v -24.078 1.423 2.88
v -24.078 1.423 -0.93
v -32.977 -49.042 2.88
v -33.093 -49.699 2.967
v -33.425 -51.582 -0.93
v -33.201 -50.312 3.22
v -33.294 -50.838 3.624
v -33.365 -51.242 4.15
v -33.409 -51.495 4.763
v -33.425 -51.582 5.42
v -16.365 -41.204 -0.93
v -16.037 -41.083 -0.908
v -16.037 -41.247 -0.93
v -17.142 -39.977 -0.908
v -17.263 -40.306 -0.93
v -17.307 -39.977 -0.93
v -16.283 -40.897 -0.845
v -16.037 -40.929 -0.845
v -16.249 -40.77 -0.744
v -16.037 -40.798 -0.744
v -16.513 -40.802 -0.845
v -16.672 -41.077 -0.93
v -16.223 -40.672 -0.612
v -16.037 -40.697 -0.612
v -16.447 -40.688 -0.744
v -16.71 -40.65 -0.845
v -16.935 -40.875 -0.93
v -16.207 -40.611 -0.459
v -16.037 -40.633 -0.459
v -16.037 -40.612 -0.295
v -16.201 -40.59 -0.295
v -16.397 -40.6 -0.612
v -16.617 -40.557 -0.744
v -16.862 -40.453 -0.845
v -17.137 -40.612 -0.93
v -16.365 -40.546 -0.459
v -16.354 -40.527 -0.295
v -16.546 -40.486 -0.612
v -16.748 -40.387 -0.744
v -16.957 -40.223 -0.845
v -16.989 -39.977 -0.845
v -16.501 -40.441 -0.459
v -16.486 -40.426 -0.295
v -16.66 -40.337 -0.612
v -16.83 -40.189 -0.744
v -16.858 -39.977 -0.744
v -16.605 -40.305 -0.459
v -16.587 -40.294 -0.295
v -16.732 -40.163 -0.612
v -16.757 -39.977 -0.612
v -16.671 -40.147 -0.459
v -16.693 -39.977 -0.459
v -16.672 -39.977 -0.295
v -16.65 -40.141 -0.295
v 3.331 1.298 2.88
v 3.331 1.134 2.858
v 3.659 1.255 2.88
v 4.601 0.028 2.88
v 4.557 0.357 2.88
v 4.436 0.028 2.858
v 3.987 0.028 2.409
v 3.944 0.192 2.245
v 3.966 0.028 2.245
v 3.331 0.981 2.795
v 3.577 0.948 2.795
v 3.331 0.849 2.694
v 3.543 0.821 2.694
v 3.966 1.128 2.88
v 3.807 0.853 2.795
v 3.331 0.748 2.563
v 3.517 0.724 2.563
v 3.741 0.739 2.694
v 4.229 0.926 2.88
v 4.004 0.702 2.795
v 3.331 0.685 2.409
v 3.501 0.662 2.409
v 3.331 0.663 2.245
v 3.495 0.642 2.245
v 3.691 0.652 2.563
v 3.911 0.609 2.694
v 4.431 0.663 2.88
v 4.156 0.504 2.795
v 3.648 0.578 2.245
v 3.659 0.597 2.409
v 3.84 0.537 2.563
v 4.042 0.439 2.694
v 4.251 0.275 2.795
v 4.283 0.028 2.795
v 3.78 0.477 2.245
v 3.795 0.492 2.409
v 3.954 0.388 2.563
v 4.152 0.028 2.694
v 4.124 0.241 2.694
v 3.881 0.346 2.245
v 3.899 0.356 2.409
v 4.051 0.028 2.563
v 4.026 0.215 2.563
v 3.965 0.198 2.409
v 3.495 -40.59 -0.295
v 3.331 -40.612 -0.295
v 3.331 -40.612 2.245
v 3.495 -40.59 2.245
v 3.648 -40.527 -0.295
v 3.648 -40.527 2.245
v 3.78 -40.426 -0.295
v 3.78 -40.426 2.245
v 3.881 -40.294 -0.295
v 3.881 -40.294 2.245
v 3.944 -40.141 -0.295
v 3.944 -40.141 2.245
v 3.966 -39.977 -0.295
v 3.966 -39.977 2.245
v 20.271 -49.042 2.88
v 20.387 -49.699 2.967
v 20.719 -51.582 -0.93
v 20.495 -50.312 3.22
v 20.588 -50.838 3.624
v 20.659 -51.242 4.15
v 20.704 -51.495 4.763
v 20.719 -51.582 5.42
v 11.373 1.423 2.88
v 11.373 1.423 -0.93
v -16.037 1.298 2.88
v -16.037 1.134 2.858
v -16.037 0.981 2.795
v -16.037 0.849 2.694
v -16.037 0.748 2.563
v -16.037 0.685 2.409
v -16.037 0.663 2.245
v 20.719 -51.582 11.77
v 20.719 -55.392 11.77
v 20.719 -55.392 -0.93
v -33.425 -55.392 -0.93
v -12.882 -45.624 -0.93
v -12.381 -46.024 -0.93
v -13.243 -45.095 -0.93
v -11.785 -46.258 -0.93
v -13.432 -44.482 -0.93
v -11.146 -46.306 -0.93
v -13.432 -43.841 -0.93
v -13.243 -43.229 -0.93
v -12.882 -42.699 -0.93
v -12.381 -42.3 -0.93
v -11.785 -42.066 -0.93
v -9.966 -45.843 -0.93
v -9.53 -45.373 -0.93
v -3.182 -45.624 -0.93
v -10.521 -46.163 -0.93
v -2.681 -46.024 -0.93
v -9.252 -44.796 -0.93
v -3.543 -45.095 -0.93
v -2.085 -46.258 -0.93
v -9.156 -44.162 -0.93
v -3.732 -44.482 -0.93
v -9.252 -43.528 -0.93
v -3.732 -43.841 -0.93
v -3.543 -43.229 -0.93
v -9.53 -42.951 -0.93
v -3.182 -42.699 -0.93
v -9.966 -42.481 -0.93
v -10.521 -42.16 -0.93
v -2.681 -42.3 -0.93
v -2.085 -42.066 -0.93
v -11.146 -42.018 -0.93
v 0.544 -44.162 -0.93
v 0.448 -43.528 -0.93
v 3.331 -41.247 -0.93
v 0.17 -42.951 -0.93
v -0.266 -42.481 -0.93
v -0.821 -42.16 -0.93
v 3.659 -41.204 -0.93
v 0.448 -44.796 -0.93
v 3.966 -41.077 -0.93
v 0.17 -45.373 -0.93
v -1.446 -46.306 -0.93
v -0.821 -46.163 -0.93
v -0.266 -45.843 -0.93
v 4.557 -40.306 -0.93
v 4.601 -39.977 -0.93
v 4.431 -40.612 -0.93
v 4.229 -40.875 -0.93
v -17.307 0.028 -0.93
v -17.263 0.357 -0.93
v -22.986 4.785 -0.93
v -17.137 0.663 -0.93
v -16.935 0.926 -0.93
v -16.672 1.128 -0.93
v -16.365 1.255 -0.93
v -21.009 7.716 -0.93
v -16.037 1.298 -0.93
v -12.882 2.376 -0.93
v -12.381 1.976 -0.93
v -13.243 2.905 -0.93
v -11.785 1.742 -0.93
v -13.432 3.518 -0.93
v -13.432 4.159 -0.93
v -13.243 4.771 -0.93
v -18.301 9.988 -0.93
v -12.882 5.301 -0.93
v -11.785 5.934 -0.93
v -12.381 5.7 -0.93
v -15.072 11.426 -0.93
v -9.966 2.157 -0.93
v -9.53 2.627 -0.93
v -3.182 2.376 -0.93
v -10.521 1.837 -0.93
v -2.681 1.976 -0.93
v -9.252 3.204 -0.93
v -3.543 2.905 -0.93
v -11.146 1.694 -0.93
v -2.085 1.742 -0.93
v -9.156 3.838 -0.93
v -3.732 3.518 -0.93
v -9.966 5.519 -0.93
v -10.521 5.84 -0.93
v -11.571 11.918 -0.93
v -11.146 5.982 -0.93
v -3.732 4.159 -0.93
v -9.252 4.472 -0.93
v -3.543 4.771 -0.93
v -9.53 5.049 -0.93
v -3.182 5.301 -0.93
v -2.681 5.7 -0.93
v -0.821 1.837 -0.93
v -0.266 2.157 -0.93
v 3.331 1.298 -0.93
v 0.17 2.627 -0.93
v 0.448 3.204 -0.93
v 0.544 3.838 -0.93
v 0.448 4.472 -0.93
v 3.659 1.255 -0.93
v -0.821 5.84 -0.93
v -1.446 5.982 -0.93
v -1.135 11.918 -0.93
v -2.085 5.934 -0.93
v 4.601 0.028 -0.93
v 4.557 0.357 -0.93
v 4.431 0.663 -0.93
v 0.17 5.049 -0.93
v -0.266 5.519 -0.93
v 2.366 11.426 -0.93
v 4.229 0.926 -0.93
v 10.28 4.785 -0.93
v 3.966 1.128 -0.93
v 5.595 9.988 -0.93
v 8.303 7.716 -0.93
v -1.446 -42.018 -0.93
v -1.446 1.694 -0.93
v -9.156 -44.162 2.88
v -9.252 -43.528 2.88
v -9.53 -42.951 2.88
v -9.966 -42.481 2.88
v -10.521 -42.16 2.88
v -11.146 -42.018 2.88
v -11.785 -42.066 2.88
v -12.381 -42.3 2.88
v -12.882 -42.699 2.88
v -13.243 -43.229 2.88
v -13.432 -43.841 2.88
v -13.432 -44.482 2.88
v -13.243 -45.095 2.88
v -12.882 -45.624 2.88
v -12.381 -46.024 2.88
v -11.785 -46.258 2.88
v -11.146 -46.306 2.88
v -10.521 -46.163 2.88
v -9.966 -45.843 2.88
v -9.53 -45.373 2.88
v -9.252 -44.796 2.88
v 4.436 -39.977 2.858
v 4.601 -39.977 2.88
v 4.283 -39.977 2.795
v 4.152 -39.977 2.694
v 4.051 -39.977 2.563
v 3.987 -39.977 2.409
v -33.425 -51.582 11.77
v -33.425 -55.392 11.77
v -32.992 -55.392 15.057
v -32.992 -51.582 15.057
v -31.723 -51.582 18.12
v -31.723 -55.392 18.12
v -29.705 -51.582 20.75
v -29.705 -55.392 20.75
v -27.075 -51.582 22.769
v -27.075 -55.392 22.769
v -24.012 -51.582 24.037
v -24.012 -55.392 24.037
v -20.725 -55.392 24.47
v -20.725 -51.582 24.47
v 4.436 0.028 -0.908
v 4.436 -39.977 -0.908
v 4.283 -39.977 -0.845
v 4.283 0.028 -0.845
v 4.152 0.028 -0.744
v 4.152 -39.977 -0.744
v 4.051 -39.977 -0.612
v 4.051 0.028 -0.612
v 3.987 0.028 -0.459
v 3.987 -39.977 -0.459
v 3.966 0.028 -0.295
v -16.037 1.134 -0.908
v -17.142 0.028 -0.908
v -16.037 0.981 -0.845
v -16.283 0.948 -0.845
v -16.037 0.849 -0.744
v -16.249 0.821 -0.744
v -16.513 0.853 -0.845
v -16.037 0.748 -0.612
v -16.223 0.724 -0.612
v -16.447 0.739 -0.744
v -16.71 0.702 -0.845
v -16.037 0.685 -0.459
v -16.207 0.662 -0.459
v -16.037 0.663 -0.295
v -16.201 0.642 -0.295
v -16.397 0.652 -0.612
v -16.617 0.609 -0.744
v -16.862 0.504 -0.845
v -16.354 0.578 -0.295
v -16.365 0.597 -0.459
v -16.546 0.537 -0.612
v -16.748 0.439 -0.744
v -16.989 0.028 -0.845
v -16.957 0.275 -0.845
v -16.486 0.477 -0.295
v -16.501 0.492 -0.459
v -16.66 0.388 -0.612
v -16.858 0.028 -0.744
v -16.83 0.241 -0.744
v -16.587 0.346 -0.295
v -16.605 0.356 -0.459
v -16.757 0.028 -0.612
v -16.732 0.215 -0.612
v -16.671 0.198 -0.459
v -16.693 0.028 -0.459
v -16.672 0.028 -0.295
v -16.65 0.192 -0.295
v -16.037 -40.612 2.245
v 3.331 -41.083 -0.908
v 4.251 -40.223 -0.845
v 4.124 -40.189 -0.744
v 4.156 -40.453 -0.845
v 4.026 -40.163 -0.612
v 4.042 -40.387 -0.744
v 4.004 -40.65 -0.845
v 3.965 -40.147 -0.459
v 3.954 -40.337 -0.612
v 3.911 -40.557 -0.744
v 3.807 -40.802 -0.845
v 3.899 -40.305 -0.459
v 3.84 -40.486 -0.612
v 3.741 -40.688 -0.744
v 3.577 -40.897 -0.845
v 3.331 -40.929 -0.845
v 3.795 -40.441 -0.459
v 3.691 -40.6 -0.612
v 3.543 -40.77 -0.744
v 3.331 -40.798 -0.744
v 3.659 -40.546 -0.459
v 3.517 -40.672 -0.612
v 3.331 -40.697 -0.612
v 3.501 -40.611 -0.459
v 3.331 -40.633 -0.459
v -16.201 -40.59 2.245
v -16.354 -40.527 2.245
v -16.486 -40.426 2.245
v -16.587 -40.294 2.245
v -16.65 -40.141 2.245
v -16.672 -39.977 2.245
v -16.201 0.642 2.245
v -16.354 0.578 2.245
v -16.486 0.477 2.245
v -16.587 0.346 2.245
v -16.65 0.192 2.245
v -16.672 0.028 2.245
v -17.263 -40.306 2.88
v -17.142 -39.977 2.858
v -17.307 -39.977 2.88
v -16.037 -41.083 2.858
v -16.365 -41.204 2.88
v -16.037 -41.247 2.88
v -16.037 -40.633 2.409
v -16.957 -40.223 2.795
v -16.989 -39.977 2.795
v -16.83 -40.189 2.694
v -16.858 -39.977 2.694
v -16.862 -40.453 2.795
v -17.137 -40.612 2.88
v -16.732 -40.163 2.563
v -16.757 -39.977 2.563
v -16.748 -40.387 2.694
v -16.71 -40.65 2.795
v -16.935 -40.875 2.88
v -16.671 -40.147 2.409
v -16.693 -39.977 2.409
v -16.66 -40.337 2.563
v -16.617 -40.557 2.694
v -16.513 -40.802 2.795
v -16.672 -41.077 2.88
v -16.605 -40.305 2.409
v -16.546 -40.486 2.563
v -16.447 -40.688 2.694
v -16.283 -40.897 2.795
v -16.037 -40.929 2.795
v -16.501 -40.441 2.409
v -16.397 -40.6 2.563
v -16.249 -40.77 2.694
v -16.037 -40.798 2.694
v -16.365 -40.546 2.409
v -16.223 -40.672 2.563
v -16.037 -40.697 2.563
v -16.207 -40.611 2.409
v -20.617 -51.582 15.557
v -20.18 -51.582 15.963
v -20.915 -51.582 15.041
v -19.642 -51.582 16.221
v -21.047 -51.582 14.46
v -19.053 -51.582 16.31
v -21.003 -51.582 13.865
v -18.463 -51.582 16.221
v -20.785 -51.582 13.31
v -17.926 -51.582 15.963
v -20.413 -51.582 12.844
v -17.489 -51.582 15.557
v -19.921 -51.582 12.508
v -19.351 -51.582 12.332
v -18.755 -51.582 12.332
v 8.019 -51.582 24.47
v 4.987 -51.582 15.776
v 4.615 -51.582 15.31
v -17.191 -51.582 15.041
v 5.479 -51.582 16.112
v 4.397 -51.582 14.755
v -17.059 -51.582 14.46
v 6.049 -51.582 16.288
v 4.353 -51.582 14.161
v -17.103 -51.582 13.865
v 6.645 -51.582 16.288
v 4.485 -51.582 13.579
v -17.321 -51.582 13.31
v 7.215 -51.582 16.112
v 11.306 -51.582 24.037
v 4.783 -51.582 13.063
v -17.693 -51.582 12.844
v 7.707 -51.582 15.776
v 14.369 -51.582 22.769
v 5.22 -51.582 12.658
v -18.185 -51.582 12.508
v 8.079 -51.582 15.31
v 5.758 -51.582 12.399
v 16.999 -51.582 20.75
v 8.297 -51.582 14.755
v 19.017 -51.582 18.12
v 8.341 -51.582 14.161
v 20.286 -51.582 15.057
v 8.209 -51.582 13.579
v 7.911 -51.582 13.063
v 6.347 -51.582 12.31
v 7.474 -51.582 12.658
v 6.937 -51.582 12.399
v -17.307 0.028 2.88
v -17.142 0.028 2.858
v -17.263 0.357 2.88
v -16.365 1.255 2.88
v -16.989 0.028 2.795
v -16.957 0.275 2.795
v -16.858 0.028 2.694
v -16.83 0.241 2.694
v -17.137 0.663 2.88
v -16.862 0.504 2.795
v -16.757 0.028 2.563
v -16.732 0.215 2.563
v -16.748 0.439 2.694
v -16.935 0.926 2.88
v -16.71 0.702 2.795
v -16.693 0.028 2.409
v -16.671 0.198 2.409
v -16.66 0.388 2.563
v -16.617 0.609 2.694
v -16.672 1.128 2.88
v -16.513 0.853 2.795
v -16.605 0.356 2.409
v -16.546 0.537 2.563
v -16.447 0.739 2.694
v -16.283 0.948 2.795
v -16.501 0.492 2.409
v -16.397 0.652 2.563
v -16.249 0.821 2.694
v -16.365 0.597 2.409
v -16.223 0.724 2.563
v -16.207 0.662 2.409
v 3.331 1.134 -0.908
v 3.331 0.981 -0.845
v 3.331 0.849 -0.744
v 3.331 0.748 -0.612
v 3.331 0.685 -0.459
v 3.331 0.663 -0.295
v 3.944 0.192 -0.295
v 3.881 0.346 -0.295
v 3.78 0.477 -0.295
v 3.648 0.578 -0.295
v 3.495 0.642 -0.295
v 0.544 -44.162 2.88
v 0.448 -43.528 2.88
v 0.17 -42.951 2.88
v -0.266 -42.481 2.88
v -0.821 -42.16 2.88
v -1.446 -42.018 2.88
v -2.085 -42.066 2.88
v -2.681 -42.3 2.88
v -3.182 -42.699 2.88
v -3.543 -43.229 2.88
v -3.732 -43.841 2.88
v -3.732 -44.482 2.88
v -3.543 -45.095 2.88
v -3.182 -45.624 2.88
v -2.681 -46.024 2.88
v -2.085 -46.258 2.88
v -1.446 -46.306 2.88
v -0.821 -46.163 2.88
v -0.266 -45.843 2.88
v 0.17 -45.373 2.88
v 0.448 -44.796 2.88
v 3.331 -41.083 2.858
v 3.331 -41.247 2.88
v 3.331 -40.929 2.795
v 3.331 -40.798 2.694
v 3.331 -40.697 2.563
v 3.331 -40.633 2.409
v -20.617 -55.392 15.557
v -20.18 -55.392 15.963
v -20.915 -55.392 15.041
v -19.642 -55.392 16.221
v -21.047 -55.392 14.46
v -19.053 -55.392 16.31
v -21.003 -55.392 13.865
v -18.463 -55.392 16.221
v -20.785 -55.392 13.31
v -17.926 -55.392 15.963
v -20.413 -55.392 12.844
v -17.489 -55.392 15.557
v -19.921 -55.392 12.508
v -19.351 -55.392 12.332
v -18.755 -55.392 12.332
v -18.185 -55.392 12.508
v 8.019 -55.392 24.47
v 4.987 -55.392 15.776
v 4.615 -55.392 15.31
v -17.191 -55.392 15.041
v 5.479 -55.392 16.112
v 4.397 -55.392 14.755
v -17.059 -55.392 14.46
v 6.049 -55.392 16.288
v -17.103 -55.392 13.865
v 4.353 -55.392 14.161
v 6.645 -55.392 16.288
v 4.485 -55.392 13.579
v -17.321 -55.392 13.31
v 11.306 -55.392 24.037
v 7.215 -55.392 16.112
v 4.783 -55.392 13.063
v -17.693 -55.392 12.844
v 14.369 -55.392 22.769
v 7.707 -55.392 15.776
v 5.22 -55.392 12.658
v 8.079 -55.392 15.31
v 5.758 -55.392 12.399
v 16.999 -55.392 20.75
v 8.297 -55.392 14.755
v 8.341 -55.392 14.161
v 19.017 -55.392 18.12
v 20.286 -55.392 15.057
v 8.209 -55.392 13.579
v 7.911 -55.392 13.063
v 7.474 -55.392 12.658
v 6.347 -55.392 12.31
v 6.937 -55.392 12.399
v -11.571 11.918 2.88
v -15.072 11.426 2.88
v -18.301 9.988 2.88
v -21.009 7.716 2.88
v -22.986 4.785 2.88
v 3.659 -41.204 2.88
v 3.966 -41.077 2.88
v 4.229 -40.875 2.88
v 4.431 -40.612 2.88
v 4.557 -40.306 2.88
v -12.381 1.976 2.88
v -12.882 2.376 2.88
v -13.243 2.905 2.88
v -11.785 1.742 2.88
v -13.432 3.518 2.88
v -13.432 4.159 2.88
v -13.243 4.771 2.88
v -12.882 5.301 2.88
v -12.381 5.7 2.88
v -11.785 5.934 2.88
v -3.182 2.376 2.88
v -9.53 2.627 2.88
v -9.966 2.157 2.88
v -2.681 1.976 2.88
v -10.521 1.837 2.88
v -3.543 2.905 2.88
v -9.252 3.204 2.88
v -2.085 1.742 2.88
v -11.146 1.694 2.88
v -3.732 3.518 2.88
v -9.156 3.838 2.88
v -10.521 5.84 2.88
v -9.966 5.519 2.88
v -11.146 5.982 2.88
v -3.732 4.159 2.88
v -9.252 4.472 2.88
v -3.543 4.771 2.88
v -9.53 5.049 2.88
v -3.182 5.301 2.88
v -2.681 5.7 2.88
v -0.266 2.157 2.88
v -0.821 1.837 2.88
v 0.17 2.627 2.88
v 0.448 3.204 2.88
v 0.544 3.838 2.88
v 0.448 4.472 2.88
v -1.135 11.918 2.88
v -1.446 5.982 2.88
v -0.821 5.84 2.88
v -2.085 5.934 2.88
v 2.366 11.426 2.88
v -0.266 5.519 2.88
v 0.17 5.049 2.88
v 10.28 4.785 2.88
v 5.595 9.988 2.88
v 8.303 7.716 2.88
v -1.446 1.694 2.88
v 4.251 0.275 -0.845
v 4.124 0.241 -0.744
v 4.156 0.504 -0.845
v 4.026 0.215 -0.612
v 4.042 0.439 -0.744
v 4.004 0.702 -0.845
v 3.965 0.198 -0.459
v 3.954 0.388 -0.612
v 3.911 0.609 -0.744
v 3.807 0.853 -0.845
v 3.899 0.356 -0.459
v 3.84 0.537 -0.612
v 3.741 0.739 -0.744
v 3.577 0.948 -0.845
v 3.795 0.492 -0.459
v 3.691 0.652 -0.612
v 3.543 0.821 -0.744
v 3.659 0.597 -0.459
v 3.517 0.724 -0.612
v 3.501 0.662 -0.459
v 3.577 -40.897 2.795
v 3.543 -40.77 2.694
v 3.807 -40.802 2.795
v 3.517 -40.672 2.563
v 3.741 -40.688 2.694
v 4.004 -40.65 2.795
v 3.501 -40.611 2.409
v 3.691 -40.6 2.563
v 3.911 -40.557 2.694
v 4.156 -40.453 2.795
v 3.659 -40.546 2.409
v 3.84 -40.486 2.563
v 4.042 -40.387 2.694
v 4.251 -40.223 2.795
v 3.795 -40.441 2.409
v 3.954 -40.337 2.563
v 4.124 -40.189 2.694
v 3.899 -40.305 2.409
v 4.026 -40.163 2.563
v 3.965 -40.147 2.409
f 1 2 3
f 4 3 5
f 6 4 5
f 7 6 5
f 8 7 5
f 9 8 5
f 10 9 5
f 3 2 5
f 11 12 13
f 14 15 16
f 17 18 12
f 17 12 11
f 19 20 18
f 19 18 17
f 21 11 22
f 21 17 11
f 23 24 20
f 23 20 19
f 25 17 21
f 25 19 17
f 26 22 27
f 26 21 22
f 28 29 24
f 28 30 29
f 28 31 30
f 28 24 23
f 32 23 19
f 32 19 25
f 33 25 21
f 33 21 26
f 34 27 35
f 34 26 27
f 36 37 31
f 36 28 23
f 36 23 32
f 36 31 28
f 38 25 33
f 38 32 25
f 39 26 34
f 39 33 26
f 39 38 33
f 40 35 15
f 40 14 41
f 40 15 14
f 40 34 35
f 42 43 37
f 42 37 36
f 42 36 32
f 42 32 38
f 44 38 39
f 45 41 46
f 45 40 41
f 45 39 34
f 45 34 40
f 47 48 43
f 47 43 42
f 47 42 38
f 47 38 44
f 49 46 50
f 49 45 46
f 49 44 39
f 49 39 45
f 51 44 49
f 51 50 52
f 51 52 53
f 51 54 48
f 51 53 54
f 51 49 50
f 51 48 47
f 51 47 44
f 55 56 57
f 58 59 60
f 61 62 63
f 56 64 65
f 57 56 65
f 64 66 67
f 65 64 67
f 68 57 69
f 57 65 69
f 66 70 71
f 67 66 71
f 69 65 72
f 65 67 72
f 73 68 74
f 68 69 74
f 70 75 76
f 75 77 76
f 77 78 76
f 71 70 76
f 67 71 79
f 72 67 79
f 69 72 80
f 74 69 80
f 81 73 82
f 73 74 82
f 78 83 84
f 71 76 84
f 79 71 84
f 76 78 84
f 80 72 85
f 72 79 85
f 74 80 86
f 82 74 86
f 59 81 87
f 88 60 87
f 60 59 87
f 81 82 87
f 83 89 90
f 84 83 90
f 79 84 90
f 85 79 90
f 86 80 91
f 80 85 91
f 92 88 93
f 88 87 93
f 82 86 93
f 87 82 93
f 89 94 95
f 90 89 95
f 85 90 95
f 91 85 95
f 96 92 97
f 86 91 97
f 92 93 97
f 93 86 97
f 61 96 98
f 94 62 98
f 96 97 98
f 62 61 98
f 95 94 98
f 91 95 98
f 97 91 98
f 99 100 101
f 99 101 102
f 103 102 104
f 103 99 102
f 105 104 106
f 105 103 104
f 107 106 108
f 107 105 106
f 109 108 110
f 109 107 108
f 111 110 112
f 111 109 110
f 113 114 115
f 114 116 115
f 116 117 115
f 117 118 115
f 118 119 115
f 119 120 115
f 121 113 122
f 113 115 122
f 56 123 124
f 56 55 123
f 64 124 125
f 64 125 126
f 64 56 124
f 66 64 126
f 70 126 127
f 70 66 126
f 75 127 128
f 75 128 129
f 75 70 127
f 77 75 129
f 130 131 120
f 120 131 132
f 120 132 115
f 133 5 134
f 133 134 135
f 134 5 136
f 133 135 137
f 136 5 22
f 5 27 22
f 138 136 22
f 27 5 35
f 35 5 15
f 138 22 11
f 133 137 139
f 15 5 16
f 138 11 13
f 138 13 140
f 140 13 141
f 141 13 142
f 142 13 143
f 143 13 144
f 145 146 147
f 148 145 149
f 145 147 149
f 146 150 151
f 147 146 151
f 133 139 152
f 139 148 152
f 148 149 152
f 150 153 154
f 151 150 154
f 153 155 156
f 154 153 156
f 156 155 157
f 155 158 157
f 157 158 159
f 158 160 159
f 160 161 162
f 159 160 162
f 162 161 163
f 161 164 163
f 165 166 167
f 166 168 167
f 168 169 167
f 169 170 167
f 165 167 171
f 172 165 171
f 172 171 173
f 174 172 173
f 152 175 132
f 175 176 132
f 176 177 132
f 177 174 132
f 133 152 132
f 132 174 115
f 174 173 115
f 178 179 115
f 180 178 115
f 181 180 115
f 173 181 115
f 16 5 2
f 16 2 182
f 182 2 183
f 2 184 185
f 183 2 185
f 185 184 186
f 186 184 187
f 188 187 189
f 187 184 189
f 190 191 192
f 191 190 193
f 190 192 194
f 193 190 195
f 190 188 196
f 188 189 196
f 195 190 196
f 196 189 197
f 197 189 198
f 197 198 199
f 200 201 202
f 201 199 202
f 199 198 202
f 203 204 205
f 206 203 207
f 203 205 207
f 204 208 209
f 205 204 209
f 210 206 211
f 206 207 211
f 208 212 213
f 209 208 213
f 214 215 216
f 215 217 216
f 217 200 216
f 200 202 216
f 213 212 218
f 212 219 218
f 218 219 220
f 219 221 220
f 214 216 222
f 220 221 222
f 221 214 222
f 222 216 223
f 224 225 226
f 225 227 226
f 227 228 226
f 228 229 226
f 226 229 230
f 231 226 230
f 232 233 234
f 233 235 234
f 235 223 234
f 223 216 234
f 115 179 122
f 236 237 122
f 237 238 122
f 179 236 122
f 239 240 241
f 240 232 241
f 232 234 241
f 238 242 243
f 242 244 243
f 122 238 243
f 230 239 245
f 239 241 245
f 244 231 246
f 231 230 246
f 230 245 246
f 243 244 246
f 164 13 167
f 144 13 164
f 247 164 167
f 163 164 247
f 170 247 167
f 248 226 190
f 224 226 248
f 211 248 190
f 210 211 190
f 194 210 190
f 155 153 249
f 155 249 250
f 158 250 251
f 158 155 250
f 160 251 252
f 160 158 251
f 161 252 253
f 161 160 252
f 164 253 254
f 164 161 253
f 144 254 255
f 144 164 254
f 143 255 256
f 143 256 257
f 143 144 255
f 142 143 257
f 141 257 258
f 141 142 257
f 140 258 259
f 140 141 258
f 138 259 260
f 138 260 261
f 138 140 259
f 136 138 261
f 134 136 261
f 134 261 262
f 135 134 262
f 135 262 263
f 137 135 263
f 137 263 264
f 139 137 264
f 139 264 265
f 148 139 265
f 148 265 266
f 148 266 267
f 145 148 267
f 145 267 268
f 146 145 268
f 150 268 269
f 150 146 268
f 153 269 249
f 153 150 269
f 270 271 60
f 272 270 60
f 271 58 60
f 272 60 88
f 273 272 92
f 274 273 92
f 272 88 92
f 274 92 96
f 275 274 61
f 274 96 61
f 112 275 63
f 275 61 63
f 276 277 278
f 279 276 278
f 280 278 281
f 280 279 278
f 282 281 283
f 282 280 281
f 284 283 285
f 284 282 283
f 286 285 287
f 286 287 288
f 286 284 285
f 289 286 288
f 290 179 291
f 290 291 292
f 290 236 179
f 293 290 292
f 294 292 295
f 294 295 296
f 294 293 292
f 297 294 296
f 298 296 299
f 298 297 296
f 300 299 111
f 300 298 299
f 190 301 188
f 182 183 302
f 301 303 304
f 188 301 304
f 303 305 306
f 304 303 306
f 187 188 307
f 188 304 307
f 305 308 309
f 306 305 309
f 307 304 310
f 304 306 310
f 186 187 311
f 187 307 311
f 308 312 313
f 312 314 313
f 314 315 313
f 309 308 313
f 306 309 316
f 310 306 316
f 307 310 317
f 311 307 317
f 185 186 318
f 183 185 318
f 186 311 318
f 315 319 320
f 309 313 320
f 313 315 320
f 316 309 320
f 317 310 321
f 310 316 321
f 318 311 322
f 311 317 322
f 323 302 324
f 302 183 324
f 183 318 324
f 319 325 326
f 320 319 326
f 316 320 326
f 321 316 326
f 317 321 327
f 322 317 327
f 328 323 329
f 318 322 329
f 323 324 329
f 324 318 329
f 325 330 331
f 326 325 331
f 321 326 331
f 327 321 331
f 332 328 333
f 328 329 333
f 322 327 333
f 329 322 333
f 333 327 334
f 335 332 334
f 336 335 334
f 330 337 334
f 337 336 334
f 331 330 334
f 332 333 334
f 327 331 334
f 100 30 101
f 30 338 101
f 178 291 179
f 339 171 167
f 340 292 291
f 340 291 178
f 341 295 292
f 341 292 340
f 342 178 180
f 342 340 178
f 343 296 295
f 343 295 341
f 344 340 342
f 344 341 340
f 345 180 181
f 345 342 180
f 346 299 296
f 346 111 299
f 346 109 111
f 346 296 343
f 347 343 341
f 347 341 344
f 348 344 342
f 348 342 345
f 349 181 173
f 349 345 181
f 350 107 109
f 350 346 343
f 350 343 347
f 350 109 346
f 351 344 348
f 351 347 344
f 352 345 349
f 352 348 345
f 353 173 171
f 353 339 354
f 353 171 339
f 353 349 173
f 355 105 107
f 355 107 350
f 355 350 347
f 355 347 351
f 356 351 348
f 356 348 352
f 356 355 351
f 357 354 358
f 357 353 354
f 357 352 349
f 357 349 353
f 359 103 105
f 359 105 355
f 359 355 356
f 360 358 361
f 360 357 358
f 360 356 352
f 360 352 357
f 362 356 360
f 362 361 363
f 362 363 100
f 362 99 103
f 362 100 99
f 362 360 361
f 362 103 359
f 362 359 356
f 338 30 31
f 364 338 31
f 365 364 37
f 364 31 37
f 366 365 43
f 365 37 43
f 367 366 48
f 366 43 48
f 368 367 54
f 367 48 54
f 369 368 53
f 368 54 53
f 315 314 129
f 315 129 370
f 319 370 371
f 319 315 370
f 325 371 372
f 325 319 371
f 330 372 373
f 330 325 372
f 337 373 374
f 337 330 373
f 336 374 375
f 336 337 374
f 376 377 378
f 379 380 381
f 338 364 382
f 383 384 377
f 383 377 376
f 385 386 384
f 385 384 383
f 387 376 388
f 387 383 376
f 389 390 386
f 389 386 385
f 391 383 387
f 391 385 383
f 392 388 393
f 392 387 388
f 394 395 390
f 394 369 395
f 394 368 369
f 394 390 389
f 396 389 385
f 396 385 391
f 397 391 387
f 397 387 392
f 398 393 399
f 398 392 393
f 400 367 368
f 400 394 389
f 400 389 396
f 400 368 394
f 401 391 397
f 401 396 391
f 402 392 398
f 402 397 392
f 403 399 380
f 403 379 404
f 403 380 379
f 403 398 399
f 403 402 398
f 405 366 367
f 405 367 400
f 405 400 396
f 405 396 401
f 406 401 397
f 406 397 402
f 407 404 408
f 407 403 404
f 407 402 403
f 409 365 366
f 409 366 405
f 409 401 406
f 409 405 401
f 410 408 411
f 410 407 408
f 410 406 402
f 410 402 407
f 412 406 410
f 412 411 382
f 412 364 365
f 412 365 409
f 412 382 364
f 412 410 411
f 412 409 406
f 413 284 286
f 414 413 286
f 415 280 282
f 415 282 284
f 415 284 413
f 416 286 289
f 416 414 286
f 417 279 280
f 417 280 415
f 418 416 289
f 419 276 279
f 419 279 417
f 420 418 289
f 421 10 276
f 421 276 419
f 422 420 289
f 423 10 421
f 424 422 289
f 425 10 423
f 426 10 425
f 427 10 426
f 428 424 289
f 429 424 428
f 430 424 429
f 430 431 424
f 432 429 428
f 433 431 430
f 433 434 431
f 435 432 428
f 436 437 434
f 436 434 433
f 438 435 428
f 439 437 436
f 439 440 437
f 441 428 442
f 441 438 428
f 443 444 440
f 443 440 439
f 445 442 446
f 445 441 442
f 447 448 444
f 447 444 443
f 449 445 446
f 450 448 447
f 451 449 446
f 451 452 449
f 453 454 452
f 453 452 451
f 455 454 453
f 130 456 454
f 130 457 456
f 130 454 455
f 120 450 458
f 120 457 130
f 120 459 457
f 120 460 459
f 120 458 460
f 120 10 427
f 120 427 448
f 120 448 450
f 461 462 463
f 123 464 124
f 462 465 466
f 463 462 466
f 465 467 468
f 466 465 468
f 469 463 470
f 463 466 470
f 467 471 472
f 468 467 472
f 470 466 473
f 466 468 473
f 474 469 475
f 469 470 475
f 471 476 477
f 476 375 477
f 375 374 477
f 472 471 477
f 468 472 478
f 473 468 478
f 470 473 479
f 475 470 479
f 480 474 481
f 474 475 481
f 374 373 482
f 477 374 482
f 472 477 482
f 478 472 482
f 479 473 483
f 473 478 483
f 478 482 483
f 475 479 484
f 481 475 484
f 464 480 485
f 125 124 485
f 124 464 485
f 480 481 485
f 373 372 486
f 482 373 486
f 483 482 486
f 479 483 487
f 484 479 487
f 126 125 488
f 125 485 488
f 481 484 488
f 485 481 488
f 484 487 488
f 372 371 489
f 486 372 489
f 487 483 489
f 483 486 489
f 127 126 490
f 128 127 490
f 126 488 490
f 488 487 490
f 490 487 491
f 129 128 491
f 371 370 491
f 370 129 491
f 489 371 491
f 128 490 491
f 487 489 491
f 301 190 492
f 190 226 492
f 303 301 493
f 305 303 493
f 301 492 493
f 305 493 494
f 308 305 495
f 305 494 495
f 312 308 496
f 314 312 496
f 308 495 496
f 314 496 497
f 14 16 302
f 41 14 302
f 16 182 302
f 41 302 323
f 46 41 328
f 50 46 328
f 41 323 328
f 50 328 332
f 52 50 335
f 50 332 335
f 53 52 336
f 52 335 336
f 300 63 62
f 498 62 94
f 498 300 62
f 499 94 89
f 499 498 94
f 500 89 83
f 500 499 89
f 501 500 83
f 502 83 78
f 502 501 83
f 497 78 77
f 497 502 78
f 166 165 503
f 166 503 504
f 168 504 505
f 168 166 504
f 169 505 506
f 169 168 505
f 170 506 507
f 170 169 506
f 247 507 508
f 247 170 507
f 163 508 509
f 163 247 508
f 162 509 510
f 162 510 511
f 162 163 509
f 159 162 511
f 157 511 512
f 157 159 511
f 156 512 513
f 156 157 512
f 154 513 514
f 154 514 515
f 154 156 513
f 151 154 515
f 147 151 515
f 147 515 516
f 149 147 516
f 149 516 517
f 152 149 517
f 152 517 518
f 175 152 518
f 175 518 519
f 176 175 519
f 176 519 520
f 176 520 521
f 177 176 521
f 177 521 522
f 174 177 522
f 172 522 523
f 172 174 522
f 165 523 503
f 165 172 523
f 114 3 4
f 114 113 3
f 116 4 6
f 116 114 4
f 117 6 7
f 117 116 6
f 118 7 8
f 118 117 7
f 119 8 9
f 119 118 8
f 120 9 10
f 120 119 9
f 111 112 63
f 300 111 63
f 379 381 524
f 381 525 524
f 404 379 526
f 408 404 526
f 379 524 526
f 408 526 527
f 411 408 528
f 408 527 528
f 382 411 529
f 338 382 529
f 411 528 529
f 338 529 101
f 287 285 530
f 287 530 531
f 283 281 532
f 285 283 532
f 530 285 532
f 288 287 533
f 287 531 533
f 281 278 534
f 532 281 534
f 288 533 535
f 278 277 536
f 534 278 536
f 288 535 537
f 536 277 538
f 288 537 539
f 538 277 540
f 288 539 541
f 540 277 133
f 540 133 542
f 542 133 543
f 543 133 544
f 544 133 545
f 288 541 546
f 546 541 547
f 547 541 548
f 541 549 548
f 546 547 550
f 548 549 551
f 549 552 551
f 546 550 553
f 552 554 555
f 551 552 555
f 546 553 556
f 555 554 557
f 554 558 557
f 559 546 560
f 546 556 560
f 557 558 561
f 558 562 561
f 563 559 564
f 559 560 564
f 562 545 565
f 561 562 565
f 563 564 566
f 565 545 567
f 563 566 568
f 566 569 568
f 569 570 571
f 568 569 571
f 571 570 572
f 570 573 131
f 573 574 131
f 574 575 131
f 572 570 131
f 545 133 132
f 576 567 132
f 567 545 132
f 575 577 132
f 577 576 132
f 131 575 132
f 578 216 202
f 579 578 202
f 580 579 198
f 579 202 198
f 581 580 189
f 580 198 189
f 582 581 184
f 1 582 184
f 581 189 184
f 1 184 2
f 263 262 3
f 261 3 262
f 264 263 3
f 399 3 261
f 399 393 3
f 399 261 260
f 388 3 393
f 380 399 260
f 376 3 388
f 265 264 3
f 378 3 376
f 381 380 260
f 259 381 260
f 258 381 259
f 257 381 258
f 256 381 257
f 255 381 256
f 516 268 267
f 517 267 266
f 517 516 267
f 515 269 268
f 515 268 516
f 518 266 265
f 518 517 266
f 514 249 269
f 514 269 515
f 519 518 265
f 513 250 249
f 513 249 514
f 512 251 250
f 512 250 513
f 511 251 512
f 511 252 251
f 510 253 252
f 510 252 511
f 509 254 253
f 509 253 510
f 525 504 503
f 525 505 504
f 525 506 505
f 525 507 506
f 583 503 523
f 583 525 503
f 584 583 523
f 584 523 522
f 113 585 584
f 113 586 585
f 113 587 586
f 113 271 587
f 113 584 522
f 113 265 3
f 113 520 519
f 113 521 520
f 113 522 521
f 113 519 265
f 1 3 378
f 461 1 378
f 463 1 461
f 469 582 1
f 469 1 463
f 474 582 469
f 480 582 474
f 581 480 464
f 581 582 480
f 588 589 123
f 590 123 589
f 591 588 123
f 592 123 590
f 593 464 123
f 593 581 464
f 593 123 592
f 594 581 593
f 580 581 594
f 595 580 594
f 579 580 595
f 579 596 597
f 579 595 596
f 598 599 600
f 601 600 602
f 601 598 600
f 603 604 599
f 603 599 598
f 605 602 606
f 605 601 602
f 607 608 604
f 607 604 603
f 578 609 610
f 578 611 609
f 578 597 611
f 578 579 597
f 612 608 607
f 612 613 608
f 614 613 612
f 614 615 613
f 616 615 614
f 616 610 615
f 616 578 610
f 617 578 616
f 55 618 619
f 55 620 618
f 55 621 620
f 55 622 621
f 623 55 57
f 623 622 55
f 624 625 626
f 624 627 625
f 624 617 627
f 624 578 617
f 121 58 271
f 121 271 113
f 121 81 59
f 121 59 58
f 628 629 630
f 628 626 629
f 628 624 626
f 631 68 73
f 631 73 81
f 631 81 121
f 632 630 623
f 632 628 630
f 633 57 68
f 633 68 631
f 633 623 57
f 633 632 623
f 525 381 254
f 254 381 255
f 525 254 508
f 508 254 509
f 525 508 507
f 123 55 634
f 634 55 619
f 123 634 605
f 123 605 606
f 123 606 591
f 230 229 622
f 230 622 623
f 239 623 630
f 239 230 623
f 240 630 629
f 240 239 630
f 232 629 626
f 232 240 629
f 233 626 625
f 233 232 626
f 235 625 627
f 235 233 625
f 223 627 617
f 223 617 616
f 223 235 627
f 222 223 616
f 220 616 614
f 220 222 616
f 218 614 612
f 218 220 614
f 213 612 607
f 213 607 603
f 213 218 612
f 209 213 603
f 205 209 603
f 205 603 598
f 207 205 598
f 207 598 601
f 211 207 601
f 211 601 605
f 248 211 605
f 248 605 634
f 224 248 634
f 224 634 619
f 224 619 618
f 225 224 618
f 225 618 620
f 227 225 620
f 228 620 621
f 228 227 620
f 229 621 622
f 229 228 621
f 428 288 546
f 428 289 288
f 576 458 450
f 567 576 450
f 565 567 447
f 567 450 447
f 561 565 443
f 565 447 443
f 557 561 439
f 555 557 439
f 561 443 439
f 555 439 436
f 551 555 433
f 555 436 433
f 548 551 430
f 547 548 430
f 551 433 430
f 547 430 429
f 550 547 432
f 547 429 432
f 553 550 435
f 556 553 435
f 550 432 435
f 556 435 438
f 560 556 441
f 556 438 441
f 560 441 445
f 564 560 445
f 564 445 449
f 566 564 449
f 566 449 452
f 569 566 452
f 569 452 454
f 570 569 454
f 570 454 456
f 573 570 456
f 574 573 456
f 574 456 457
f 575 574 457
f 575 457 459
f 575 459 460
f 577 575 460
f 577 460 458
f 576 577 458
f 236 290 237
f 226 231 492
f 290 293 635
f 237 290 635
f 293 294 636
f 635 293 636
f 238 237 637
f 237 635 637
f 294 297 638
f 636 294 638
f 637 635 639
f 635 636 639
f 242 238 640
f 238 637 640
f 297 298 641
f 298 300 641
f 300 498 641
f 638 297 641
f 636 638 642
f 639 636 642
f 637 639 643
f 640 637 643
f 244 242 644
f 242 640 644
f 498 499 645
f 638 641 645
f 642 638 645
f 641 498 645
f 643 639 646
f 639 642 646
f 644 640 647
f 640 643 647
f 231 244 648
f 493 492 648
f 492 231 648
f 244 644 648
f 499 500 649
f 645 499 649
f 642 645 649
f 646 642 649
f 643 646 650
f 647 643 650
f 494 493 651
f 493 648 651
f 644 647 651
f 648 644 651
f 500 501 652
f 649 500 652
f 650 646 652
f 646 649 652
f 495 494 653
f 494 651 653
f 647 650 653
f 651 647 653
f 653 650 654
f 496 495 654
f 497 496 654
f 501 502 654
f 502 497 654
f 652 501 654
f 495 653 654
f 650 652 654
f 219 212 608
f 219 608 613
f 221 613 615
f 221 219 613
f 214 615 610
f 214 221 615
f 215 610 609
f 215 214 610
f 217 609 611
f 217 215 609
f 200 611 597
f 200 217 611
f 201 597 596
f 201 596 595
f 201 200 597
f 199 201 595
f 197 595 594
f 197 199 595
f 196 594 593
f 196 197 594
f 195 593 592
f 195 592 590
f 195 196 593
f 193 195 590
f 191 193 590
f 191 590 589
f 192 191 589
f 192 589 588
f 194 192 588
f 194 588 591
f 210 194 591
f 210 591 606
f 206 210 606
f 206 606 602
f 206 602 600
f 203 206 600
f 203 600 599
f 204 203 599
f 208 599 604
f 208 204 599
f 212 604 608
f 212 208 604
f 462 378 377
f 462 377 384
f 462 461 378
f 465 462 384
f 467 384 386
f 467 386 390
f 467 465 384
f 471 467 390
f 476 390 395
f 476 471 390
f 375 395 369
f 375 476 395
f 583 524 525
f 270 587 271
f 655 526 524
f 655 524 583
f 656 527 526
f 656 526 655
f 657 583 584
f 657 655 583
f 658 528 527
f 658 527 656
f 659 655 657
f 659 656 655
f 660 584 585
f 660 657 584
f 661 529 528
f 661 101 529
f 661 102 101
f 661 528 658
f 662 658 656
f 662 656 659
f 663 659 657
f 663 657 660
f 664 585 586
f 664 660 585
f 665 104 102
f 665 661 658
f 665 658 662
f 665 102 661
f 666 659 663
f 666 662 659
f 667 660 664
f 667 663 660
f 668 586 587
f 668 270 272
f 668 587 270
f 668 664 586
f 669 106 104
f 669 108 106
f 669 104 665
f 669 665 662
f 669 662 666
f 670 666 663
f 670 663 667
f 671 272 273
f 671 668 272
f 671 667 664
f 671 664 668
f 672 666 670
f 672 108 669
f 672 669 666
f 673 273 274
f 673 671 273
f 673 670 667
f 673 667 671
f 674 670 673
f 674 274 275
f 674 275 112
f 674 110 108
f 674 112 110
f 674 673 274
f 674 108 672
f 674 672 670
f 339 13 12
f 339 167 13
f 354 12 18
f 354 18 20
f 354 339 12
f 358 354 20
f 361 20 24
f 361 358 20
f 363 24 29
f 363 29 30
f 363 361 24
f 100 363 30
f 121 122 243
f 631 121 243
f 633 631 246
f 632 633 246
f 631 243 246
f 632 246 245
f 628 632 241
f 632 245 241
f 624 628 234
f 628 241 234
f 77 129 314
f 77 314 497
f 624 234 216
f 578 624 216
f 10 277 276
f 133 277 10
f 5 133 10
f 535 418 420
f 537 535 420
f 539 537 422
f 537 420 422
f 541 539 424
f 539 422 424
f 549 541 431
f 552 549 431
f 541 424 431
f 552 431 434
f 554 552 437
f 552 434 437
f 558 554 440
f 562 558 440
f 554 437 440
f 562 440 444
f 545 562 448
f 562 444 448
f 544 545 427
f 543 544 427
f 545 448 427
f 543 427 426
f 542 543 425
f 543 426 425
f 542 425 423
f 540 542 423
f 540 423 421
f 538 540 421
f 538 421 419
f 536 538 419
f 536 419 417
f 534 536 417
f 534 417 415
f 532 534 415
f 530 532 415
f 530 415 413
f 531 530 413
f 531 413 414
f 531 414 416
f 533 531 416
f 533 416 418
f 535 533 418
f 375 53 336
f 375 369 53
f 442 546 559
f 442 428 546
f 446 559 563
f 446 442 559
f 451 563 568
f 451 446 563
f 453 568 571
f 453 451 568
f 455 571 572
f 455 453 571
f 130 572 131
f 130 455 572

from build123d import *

# Parameters (mm, degrees)
FILLET2_START       = -0.929916211
FILLET2_OUTLINE_R   = 2.15
FILLET2_DEPTH       = 3.81
FILLET2_START_2     = 2.880083789
FILLET2_2_OUTLINE_W = 54.14352655
FILLET2_2_OUTLINE_H = 3.81
FILLET2_2_DEPTH     = 34.29
FILLET6_R           = 2.54
SKETCH6_W           = 54.14352655
SKETCH6_H           = 3.81
CUT_EXTRUDE2_DEPTH  = 12.7
FILLET8_R           = 12.7
SKETCH7_R           = 1.999996
CUT_EXTRUDE3_DEPTH  = 76.817206459
SKETCH8_W           = 20.6375
SKETCH8_H           = 41.275
CUT_EXTRUDE5_DEPTH  = 69.202637613
FILLET10_R          = 0.635


with BuildPart() as part:
    # Fillet2: read off the stored shape, not the designer's step
    # Fillet2 outline → Fillet2 (new body)
    with BuildSketch(Plane.XY.offset(FILLET2_START)):
        with BuildLine():
            Line((20.718778313, -51.581857548), (11.372508186, 1.423474309))
            ThreePointArc((11.372508186, 1.423474309), (7.028852365, 8.94690688), (-1.134550278, 11.918142452))
            Line((-1.134550278, 11.918142452), (-11.571419646, 11.918142452))
            ThreePointArc((-11.571419646, 11.918142452), (-19.734822289, 8.94690688), (-24.078478109, 1.423474309))
            Line((-24.078478109, 1.423474309), (-33.424748237, -51.581857548))
            Line((-33.424748237, -51.581857548), (-33.424748237, -55.391857548))
            Line((-33.424748237, -55.391857548), (20.718778313, -55.391857548))
            Line((20.718778313, -55.391857548), (20.718778313, -51.581857548))
        make_face()
        with Locations((-11.306344138, -44.161858203)):
            Circle(FILLET2_OUTLINE_R, mode=Mode.SUBTRACT)
        with Locations((-1.606344138, -44.161858203)):
            Circle(FILLET2_OUTLINE_R, mode=Mode.SUBTRACT)
        with Locations((-11.306344138, 3.838143108)):
            Circle(FILLET2_OUTLINE_R, mode=Mode.SUBTRACT)
        with Locations((-1.606344138, 3.838143108)):
            Circle(FILLET2_OUTLINE_R, mode=Mode.SUBTRACT)
    extrude(amount=FILLET2_DEPTH)

    # Fillet2 2 outline → Fillet2 2 (add)
    with BuildSketch(Plane.XY.offset(FILLET2_START_2)):
        with Locations((-6.352984962, -53.486857548)):
            Rectangle(FILLET2_2_OUTLINE_W, FILLET2_2_OUTLINE_H)
    extrude(amount=FILLET2_2_DEPTH)

    # Fillet6
    fillet6_edges = [part.edges().sort_by_distance(p)[0] for p in [
        (-6.352984962, -51.581857548, 2.880083789),
    ]]
    fillet(fillet6_edges, radius=FILLET6_R)

    # Sketch6 → Cut-Extrude2 (cut)
    with BuildSketch(Plane.XY.offset(37.170083789)):
        with Locations((-6.352984962, -53.486857548)):
            Rectangle(SKETCH6_W, SKETCH6_H)
    extrude(amount=-CUT_EXTRUDE2_DEPTH, mode=Mode.SUBTRACT)

    # Fillet8
    fillet8_edges = [part.edges().sort_by_distance(p)[0] for p in [
        (-33.424748237, -53.486857548, 24.470083789),
        (20.718778313, -53.486857548, 24.470083789),
    ]]
    fillet(fillet8_edges, radius=FILLET8_R)

    # Sketch7 → Cut-Extrude3 (cut, through all)
    with BuildSketch(Plane(origin=(0, -51.581857548, 0), x_dir=(1, 0, 0), z_dir=(0, 1, 0))):
        with Locations(Location((-19.052984962, -14.310083789, 0), (0, 0, 270))):
            Circle(SKETCH7_R)
        with Locations(Location((6.347015038, -14.310083789, 0), (0, 0, 90))):
            Circle(SKETCH7_R)
    extrude(amount=-CUT_EXTRUDE3_DEPTH, mode=Mode.SUBTRACT)

    # Sketch8 → Cut-Extrude5 (cut, through all)
    with BuildSketch(Plane.XY.offset(2.880083789)):
        with Locations((-6.352984962, -19.974356892)):
            Rectangle(SKETCH8_W, SKETCH8_H)
    extrude(amount=-CUT_EXTRUDE5_DEPTH, mode=Mode.SUBTRACT)

    # Fillet10
    fillet10_edges = [part.edges().sort_by_distance(p)[0] for p in [
        (3.965765038, -19.974356892, 2.880083789),
        (3.965765038, 0.663143108, 0.975083789),
        (-6.352984962, -40.611856892, -0.929916211),
        (3.965765038, -40.611856892, 0.975083789),
        (-16.671734962, -19.974356892, -0.929916211),
        (-16.671734962, -40.611856892, 0.975083789),
        (-6.352984962, 0.663143108, 2.880083789),
        (-16.671734962, 0.663143108, 0.975083789),
        (3.965765038, -19.974356892, -0.929916211),
        (-6.352984962, 0.663143108, -0.929916211),
        (-16.671734962, -19.974356892, 2.880083789),
        (-6.352984962, -40.611856892, 2.880083789),
    ]]
    fillet(fillet10_edges, radius=FILLET10_R)


solid = part.part
